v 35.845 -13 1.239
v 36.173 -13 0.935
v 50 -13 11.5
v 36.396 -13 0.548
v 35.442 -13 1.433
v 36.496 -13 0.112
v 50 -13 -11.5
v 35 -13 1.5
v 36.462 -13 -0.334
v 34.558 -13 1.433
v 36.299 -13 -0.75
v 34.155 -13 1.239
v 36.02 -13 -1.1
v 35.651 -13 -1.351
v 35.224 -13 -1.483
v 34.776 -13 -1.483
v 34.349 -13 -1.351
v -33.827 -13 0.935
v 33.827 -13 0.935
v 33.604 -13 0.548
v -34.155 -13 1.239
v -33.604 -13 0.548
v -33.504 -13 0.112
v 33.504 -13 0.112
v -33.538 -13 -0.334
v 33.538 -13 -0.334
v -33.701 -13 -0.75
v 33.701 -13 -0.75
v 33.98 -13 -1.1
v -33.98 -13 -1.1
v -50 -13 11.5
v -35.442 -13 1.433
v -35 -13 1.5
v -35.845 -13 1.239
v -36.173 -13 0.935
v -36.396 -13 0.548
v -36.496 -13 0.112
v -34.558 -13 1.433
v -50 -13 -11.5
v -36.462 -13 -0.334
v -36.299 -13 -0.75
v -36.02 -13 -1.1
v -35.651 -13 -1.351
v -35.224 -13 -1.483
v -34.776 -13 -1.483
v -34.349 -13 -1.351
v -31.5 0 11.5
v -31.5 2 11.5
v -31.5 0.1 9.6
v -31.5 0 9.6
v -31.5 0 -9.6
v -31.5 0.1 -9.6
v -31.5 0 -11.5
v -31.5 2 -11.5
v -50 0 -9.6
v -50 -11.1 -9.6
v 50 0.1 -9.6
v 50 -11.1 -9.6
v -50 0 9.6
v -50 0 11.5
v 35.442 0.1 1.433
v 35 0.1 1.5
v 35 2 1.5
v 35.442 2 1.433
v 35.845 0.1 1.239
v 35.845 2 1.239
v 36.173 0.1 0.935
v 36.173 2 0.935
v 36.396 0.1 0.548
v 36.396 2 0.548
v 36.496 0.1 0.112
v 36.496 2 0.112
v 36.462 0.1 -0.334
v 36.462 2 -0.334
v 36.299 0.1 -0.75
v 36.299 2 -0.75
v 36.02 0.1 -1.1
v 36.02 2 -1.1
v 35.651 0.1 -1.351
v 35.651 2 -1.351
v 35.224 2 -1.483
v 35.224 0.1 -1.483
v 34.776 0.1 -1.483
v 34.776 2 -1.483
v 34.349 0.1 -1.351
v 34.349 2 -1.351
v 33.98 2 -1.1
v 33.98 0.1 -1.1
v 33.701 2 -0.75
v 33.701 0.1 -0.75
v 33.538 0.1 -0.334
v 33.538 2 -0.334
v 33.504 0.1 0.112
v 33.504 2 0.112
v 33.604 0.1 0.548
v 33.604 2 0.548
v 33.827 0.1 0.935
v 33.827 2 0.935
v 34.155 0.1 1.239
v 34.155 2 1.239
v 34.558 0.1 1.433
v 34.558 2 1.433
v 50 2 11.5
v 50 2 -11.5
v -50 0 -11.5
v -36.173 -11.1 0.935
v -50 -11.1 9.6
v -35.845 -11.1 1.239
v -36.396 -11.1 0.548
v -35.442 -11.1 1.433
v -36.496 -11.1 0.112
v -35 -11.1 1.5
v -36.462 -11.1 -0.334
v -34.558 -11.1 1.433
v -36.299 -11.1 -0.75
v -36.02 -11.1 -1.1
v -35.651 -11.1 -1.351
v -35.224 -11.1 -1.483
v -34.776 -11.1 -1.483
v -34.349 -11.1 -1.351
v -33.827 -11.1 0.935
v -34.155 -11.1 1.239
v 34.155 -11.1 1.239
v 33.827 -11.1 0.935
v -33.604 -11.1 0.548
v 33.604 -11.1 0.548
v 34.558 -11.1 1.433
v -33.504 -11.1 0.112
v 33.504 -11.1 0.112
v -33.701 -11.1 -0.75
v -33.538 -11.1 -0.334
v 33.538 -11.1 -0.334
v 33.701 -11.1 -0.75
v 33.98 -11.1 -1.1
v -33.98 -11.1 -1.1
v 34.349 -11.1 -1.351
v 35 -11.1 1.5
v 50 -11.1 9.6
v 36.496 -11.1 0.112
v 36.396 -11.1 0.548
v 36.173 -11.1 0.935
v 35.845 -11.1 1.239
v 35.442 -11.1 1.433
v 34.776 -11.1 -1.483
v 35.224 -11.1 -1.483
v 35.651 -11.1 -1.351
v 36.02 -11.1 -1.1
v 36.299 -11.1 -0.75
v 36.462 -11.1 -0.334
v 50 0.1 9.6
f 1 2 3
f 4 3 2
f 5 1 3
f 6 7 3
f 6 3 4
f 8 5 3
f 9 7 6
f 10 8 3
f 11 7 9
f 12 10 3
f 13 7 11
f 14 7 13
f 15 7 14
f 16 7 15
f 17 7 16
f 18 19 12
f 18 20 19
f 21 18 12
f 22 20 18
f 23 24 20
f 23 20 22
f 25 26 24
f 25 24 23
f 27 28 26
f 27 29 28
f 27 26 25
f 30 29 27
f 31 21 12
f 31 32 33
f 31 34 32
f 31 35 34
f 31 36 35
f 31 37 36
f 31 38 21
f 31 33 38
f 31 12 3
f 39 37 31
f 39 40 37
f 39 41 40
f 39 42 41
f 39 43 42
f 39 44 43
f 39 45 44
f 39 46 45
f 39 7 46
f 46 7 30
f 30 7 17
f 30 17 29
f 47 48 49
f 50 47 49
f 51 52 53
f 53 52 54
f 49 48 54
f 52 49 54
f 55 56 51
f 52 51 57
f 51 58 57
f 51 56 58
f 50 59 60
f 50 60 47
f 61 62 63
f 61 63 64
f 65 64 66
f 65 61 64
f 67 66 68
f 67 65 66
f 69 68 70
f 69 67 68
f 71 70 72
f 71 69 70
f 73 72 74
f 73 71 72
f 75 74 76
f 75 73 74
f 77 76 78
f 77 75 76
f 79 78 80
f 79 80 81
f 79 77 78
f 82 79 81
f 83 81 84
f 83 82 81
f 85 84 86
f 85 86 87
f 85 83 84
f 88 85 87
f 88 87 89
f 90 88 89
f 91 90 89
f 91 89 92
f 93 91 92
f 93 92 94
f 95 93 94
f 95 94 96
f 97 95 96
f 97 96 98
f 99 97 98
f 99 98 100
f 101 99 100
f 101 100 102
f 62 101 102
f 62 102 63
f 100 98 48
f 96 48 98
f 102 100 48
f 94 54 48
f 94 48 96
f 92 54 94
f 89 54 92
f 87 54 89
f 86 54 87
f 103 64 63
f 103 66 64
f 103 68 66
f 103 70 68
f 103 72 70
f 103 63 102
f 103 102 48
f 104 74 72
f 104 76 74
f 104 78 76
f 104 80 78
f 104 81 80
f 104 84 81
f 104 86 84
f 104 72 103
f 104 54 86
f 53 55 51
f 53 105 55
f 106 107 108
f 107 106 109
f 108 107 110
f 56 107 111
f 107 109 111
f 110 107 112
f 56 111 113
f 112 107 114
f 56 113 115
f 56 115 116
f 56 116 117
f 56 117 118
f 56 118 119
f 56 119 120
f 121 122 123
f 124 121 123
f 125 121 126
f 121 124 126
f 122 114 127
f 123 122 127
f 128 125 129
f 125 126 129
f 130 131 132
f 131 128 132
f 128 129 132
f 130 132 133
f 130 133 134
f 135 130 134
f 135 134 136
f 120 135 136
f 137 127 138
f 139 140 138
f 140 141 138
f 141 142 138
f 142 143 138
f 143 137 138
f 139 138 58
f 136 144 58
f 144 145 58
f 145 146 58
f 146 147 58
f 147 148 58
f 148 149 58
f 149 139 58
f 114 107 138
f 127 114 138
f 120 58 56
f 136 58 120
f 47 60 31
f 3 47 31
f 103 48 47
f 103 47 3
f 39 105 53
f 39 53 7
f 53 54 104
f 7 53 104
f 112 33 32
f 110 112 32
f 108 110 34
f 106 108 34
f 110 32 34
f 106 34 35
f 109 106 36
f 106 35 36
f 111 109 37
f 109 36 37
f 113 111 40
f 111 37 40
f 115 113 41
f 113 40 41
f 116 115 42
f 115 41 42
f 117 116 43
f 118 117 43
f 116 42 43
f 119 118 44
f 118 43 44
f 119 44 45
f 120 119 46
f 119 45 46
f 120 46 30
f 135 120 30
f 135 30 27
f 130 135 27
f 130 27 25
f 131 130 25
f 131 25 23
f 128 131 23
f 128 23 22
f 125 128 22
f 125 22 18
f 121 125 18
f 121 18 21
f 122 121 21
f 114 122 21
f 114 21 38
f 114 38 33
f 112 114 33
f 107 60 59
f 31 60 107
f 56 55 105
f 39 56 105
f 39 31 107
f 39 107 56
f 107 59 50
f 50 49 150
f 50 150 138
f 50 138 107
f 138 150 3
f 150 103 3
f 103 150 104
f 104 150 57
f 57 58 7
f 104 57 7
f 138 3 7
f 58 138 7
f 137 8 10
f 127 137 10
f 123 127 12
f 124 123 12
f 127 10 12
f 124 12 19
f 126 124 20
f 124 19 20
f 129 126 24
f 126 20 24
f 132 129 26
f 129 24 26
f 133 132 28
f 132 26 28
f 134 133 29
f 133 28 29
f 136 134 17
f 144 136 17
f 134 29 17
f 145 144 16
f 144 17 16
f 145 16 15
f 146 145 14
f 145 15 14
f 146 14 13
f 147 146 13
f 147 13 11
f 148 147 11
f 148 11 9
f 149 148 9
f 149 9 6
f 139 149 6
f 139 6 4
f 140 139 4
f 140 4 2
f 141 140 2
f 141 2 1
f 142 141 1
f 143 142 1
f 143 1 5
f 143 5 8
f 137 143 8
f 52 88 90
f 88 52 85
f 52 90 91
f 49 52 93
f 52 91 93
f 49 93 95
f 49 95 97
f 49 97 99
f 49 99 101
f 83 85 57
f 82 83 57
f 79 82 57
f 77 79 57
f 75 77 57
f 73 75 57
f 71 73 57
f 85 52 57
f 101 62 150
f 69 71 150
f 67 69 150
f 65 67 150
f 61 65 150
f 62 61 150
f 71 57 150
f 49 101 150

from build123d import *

# Parameters (mm, degrees)
SKETCH_1_W          = 100
SKETCH_1_H          = 19
SKETCH_1_R          = 1.5
EXTRUDE_2_DEPTH     = 2
SKETCH_2_W          = 100
SKETCH_2_H          = 2
EXTRUDE_3_DEPTH     = 15
SKETCH_3_W          = 100
SKETCH_3_H          = 19
SKETCH_3_R          = 1.5
EXTRUDE_5_DEPTH     = 2
CUT_EXTRUDE_1_DEPTH = 2
SKETCH_7_W          = 19
SKETCH_7_H          = 11
CUT_EXTRUDE_2_DEPTH = 100
CUT_EXTRUDE_3_DEPTH = 2


with BuildPart() as part:
    # 草图1 → 凸台-拉伸2 (new body)
    with BuildSketch(Plane(origin=(0, 0, 0), x_dir=(1, 0, 0), z_dir=(0, 1, 0))):
        Rectangle(SKETCH_1_W, SKETCH_1_H)
        with Locations(Location((-35, 0, 0), (0, 0, 270))):
            Circle(SKETCH_1_R, mode=Mode.SUBTRACT)
        with Locations(Location((35, 0, 0), (0, 0, 270))):
            Circle(SKETCH_1_R, mode=Mode.SUBTRACT)
    extrude(amount=EXTRUDE_2_DEPTH)

    # 草图2 → 凸台-拉伸3 (add)
    with BuildSketch(Plane(origin=(0, 2, 0), x_dir=(1, 0, 0), z_dir=(0, 1, 0))):
        with Locations((0, -10.5)):
            Rectangle(SKETCH_2_W, SKETCH_2_H)
        with Locations((0, 10.5)):
            Rectangle(SKETCH_2_W, SKETCH_2_H)
    extrude(amount=-EXTRUDE_3_DEPTH)

    # 草图3 → 凸台-拉伸5 (add)
    with BuildSketch(Plane(origin=(0, -13, 0), x_dir=(-1, 0, 0), z_dir=(0, -1, 0))):
        Rectangle(SKETCH_3_W, SKETCH_3_H)
        with Locations(Location((35, 0, 0), (0, 0, 270))):
            Circle(SKETCH_3_R, mode=Mode.SUBTRACT)
        with Locations(Location((-35, 0, 0), (0, 0, 270))):
            Circle(SKETCH_3_R, mode=Mode.SUBTRACT)
    extrude(amount=-EXTRUDE_5_DEPTH)

    # 草图5 → 切除-拉伸1 (cut)
    with BuildSketch(Plane(origin=(0, 2, 0), x_dir=(1, 0, 0), z_dir=(0, 1, 0))):
        Polygon((-38.5, -11.5), (-38.5, 0), (-38.5, 11.5), (-50, 11.5), (-50, -11.5), align=None)
    extrude(amount=-CUT_EXTRUDE_1_DEPTH, mode=Mode.SUBTRACT)

    # 草图7 → 切除-拉伸2 (cut)
    with BuildSketch(Plane(origin=(50, 0, 0), x_dir=(0, 0, -1), z_dir=(1, 0, 0))):
        Polygon((9.5, 0), (9.5, -11), (9.6, -11), (9.6, 0.1), (-9.5, 0.1), (-9.5, 0), align=None)
        with Locations((0, -5.5)):
            Rectangle(SKETCH_7_W, SKETCH_7_H)
        Polygon((-9.6, 0.1), (-9.6, -11.1), (9.6, -11.1), (9.6, -11), (9.5, -11), (-9.5, -11), (-9.5, 0), (-9.5, 0.1), align=None)
    extrude(amount=-CUT_EXTRUDE_2_DEPTH, mode=Mode.SUBTRACT)

    # 草图8 → 切除-拉伸3 (cut)
    with BuildSketch(Plane(origin=(0, 2, 0), x_dir=(1, 0, 0), z_dir=(0, 1, 0))):
        Polygon((-31.5, -11.5), (-31.5, 0), (-31.5, 11.5), (-38.5, 11.5), (-38.5, -11.5), align=None)
    extrude(amount=-CUT_EXTRUDE_3_DEPTH, mode=Mode.SUBTRACT)


solid = part.part
